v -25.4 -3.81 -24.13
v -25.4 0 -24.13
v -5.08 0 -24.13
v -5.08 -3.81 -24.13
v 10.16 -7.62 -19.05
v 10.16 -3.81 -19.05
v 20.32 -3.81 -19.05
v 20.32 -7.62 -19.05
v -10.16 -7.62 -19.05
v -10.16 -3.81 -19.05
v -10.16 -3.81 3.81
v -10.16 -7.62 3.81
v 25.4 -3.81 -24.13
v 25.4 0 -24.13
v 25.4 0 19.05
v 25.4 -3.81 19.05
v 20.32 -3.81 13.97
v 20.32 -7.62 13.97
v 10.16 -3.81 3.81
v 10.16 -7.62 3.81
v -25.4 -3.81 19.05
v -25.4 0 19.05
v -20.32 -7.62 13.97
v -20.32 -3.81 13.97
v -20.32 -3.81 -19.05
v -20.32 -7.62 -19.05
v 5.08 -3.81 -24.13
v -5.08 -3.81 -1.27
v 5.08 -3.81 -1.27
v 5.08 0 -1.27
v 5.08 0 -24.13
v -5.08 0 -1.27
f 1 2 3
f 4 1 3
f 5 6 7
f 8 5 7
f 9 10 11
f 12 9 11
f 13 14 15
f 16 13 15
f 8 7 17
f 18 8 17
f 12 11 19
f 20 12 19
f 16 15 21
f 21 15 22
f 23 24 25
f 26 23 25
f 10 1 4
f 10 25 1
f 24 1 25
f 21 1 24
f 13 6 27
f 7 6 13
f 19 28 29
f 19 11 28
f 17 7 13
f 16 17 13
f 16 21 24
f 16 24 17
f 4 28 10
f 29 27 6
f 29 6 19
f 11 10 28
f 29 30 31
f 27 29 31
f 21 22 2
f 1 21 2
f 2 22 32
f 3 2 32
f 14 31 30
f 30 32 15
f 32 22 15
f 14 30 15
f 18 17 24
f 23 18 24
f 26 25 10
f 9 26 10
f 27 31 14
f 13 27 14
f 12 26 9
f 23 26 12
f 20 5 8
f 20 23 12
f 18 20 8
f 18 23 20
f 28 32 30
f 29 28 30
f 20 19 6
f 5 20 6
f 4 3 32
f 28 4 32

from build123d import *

# Parameters (mm, degrees)
F1_DEPTH = 7.62
F2_DEPTH = 3.81


with BuildPart() as f1:
    # F0 (on Front) → F1 (new body)
    with BuildSketch(Plane.XZ):
        Polygon((-20.32, 13.97), (-20.32, -19.05), (-10.16, -19.05), (-10.16, 3.81), (10.16, 3.81), (10.16, -19.05), (20.32, -19.05), (20.32, 13.97), align=None)
    extrude(amount=F1_DEPTH)

    # F0 (on Front) → F2 (join)
    with BuildSketch(Plane.XZ):
        Polygon((25.4, 19.05), (-25.4, 19.05), (-25.4, -19.05), (-20.32, -19.05), (-20.32, 13.97), (20.32, 13.97), (20.32, -19.05), (25.4, -19.05), align=None)
        Polygon((-10.16, 3.81), (-10.16, -19.05), (-5.08, -19.05), (-5.08, -1.27), (5.08, -1.27), (5.08, -19.05), (10.16, -19.05), (10.16, 3.81), align=None)
        Polygon((-20.32, -19.05), (-25.4, -19.05), (-25.4, -24.13), (-5.08, -24.13), (-5.08, -19.05), (-10.16, -19.05), align=None)
        Polygon((25.4, -24.13), (25.4, -19.05), (20.32, -19.05), (10.16, -19.05), (5.08, -19.05), (5.08, -24.13), align=None)
    extrude(amount=F2_DEPTH)


solid = f1.part
